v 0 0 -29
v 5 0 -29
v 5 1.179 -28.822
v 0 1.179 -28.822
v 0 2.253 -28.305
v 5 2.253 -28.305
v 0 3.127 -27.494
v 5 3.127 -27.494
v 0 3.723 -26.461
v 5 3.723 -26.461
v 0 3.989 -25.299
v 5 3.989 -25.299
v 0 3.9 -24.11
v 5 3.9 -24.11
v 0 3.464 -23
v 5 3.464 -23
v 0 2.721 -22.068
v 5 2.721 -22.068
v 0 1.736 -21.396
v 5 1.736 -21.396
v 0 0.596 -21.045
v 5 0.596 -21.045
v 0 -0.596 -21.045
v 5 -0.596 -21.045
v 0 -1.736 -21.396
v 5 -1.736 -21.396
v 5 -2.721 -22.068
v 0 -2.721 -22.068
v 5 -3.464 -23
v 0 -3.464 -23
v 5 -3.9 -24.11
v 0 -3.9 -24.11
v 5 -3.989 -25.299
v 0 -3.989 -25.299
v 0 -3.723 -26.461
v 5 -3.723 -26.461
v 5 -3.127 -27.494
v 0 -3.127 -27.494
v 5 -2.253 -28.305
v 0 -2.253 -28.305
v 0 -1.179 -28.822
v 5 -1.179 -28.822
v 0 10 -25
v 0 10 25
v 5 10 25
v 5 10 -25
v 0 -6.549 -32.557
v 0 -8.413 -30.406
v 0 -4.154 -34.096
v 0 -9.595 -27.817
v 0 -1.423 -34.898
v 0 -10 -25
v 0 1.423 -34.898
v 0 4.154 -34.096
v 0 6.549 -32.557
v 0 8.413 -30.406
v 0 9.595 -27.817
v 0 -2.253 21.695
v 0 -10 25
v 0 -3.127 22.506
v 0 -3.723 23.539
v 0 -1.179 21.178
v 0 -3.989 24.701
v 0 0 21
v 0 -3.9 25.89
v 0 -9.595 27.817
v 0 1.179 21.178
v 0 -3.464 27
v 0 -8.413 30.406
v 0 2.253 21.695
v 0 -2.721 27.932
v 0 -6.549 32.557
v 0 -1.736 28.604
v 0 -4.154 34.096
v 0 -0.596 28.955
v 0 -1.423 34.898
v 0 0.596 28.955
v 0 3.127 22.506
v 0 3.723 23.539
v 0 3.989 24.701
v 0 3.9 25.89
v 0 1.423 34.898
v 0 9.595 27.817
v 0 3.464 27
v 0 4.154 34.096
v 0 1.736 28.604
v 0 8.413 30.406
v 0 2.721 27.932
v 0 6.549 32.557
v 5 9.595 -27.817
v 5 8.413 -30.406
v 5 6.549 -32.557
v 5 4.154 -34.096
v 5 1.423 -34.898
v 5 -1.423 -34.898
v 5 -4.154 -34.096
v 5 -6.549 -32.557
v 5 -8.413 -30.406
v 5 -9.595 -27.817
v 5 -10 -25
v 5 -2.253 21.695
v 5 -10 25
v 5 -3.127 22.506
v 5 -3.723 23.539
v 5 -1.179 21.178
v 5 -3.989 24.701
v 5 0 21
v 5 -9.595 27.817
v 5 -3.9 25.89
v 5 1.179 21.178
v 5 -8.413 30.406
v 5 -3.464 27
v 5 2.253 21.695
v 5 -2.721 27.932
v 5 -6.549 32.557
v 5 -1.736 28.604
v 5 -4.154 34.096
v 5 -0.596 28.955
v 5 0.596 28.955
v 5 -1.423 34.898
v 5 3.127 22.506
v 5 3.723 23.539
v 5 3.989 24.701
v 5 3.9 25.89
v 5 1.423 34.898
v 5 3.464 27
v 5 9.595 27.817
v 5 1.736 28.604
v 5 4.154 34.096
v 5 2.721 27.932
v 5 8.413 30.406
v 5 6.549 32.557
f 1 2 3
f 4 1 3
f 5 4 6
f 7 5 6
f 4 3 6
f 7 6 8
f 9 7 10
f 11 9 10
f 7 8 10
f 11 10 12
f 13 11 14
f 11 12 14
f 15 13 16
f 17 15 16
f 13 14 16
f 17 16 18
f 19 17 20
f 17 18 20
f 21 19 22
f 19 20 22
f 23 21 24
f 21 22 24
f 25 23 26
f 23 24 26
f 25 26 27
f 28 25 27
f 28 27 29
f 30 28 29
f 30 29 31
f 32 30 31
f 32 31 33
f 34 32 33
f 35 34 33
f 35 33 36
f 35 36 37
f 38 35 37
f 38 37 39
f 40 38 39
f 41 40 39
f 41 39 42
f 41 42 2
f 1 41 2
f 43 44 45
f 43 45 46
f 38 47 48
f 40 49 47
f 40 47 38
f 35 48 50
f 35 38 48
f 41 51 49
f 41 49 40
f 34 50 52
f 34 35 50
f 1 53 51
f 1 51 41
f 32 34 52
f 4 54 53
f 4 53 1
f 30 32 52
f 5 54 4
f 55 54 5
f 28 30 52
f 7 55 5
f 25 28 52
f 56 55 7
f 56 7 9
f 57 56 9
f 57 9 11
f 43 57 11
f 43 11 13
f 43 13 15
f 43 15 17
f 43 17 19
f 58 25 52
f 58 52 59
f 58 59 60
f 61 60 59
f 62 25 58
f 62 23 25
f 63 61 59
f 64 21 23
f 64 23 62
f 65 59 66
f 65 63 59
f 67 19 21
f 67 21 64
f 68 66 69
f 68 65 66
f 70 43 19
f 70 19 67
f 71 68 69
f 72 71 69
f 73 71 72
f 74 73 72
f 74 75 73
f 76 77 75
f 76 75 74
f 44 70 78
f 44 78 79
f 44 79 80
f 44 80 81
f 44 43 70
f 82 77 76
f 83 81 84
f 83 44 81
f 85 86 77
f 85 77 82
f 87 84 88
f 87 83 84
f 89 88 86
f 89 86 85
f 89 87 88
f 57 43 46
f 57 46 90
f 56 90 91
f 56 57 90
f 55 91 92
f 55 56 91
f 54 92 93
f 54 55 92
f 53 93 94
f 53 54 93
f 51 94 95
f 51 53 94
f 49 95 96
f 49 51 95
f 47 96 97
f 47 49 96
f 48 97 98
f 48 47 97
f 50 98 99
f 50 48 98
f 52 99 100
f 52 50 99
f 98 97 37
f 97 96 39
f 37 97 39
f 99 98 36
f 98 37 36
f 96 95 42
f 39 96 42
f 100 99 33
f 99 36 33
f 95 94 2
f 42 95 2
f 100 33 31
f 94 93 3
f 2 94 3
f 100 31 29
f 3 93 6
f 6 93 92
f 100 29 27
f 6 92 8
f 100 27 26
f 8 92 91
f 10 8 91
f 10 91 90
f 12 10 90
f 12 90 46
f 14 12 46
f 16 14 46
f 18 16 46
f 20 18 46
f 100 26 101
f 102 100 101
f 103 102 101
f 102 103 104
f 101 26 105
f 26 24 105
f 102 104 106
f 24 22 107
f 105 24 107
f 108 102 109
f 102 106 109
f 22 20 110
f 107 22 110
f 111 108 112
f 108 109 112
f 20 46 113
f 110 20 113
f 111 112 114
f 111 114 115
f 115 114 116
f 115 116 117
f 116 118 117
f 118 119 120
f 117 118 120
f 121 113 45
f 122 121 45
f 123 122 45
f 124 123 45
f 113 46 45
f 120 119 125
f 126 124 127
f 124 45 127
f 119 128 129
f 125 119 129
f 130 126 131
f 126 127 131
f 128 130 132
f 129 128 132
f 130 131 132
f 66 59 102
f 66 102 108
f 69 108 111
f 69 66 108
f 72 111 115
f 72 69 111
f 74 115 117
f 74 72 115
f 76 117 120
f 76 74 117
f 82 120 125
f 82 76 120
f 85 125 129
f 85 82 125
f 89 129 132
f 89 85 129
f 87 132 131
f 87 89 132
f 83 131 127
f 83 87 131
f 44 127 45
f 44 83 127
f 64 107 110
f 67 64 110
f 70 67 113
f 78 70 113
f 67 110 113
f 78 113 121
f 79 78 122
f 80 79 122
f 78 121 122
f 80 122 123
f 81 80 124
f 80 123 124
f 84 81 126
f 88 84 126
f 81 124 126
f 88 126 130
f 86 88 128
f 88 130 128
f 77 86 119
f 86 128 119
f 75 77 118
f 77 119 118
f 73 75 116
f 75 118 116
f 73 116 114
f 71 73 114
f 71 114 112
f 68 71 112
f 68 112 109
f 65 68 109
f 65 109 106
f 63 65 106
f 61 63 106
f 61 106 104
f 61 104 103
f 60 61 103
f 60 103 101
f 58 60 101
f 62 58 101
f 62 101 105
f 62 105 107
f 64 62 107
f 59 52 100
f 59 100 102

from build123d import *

# Parameters (mm, degrees)
BOSS_EXTRUDE1_DEPTH = 5
SKETCH2_R           = 4
CUT_EXTRUDE1_DEPTH  = 6


with BuildPart() as part:
    # Sketch1 → Boss-Extrude1 (new body)
    with BuildSketch(Plane(origin=(0, 0, 0), x_dir=(0, 0, -1), z_dir=(1, 0, 0))):
        with BuildLine():
            Line((-25, 10), (25, 10))
            ThreePointArc((25, 10), (35, 0), (25, -10))
            Line((25, -10), (-25, -10))
            ThreePointArc((-25, -10), (-35, 0), (-25, 10))
        make_face()
    extrude(amount=BOSS_EXTRUDE1_DEPTH)

    # Sketch2 → Cut-Extrude1 (cut, through all)
    with BuildSketch(Plane(origin=(5, 0, 0), x_dir=(0, 0, -1), z_dir=(1, 0, 0))):
        with Locations((-25, 0)):
            Circle(SKETCH2_R)
        with Locations((25, 0)):
            Circle(SKETCH2_R)
    extrude(amount=-CUT_EXTRUDE1_DEPTH, mode=Mode.SUBTRACT)


solid = part.part
